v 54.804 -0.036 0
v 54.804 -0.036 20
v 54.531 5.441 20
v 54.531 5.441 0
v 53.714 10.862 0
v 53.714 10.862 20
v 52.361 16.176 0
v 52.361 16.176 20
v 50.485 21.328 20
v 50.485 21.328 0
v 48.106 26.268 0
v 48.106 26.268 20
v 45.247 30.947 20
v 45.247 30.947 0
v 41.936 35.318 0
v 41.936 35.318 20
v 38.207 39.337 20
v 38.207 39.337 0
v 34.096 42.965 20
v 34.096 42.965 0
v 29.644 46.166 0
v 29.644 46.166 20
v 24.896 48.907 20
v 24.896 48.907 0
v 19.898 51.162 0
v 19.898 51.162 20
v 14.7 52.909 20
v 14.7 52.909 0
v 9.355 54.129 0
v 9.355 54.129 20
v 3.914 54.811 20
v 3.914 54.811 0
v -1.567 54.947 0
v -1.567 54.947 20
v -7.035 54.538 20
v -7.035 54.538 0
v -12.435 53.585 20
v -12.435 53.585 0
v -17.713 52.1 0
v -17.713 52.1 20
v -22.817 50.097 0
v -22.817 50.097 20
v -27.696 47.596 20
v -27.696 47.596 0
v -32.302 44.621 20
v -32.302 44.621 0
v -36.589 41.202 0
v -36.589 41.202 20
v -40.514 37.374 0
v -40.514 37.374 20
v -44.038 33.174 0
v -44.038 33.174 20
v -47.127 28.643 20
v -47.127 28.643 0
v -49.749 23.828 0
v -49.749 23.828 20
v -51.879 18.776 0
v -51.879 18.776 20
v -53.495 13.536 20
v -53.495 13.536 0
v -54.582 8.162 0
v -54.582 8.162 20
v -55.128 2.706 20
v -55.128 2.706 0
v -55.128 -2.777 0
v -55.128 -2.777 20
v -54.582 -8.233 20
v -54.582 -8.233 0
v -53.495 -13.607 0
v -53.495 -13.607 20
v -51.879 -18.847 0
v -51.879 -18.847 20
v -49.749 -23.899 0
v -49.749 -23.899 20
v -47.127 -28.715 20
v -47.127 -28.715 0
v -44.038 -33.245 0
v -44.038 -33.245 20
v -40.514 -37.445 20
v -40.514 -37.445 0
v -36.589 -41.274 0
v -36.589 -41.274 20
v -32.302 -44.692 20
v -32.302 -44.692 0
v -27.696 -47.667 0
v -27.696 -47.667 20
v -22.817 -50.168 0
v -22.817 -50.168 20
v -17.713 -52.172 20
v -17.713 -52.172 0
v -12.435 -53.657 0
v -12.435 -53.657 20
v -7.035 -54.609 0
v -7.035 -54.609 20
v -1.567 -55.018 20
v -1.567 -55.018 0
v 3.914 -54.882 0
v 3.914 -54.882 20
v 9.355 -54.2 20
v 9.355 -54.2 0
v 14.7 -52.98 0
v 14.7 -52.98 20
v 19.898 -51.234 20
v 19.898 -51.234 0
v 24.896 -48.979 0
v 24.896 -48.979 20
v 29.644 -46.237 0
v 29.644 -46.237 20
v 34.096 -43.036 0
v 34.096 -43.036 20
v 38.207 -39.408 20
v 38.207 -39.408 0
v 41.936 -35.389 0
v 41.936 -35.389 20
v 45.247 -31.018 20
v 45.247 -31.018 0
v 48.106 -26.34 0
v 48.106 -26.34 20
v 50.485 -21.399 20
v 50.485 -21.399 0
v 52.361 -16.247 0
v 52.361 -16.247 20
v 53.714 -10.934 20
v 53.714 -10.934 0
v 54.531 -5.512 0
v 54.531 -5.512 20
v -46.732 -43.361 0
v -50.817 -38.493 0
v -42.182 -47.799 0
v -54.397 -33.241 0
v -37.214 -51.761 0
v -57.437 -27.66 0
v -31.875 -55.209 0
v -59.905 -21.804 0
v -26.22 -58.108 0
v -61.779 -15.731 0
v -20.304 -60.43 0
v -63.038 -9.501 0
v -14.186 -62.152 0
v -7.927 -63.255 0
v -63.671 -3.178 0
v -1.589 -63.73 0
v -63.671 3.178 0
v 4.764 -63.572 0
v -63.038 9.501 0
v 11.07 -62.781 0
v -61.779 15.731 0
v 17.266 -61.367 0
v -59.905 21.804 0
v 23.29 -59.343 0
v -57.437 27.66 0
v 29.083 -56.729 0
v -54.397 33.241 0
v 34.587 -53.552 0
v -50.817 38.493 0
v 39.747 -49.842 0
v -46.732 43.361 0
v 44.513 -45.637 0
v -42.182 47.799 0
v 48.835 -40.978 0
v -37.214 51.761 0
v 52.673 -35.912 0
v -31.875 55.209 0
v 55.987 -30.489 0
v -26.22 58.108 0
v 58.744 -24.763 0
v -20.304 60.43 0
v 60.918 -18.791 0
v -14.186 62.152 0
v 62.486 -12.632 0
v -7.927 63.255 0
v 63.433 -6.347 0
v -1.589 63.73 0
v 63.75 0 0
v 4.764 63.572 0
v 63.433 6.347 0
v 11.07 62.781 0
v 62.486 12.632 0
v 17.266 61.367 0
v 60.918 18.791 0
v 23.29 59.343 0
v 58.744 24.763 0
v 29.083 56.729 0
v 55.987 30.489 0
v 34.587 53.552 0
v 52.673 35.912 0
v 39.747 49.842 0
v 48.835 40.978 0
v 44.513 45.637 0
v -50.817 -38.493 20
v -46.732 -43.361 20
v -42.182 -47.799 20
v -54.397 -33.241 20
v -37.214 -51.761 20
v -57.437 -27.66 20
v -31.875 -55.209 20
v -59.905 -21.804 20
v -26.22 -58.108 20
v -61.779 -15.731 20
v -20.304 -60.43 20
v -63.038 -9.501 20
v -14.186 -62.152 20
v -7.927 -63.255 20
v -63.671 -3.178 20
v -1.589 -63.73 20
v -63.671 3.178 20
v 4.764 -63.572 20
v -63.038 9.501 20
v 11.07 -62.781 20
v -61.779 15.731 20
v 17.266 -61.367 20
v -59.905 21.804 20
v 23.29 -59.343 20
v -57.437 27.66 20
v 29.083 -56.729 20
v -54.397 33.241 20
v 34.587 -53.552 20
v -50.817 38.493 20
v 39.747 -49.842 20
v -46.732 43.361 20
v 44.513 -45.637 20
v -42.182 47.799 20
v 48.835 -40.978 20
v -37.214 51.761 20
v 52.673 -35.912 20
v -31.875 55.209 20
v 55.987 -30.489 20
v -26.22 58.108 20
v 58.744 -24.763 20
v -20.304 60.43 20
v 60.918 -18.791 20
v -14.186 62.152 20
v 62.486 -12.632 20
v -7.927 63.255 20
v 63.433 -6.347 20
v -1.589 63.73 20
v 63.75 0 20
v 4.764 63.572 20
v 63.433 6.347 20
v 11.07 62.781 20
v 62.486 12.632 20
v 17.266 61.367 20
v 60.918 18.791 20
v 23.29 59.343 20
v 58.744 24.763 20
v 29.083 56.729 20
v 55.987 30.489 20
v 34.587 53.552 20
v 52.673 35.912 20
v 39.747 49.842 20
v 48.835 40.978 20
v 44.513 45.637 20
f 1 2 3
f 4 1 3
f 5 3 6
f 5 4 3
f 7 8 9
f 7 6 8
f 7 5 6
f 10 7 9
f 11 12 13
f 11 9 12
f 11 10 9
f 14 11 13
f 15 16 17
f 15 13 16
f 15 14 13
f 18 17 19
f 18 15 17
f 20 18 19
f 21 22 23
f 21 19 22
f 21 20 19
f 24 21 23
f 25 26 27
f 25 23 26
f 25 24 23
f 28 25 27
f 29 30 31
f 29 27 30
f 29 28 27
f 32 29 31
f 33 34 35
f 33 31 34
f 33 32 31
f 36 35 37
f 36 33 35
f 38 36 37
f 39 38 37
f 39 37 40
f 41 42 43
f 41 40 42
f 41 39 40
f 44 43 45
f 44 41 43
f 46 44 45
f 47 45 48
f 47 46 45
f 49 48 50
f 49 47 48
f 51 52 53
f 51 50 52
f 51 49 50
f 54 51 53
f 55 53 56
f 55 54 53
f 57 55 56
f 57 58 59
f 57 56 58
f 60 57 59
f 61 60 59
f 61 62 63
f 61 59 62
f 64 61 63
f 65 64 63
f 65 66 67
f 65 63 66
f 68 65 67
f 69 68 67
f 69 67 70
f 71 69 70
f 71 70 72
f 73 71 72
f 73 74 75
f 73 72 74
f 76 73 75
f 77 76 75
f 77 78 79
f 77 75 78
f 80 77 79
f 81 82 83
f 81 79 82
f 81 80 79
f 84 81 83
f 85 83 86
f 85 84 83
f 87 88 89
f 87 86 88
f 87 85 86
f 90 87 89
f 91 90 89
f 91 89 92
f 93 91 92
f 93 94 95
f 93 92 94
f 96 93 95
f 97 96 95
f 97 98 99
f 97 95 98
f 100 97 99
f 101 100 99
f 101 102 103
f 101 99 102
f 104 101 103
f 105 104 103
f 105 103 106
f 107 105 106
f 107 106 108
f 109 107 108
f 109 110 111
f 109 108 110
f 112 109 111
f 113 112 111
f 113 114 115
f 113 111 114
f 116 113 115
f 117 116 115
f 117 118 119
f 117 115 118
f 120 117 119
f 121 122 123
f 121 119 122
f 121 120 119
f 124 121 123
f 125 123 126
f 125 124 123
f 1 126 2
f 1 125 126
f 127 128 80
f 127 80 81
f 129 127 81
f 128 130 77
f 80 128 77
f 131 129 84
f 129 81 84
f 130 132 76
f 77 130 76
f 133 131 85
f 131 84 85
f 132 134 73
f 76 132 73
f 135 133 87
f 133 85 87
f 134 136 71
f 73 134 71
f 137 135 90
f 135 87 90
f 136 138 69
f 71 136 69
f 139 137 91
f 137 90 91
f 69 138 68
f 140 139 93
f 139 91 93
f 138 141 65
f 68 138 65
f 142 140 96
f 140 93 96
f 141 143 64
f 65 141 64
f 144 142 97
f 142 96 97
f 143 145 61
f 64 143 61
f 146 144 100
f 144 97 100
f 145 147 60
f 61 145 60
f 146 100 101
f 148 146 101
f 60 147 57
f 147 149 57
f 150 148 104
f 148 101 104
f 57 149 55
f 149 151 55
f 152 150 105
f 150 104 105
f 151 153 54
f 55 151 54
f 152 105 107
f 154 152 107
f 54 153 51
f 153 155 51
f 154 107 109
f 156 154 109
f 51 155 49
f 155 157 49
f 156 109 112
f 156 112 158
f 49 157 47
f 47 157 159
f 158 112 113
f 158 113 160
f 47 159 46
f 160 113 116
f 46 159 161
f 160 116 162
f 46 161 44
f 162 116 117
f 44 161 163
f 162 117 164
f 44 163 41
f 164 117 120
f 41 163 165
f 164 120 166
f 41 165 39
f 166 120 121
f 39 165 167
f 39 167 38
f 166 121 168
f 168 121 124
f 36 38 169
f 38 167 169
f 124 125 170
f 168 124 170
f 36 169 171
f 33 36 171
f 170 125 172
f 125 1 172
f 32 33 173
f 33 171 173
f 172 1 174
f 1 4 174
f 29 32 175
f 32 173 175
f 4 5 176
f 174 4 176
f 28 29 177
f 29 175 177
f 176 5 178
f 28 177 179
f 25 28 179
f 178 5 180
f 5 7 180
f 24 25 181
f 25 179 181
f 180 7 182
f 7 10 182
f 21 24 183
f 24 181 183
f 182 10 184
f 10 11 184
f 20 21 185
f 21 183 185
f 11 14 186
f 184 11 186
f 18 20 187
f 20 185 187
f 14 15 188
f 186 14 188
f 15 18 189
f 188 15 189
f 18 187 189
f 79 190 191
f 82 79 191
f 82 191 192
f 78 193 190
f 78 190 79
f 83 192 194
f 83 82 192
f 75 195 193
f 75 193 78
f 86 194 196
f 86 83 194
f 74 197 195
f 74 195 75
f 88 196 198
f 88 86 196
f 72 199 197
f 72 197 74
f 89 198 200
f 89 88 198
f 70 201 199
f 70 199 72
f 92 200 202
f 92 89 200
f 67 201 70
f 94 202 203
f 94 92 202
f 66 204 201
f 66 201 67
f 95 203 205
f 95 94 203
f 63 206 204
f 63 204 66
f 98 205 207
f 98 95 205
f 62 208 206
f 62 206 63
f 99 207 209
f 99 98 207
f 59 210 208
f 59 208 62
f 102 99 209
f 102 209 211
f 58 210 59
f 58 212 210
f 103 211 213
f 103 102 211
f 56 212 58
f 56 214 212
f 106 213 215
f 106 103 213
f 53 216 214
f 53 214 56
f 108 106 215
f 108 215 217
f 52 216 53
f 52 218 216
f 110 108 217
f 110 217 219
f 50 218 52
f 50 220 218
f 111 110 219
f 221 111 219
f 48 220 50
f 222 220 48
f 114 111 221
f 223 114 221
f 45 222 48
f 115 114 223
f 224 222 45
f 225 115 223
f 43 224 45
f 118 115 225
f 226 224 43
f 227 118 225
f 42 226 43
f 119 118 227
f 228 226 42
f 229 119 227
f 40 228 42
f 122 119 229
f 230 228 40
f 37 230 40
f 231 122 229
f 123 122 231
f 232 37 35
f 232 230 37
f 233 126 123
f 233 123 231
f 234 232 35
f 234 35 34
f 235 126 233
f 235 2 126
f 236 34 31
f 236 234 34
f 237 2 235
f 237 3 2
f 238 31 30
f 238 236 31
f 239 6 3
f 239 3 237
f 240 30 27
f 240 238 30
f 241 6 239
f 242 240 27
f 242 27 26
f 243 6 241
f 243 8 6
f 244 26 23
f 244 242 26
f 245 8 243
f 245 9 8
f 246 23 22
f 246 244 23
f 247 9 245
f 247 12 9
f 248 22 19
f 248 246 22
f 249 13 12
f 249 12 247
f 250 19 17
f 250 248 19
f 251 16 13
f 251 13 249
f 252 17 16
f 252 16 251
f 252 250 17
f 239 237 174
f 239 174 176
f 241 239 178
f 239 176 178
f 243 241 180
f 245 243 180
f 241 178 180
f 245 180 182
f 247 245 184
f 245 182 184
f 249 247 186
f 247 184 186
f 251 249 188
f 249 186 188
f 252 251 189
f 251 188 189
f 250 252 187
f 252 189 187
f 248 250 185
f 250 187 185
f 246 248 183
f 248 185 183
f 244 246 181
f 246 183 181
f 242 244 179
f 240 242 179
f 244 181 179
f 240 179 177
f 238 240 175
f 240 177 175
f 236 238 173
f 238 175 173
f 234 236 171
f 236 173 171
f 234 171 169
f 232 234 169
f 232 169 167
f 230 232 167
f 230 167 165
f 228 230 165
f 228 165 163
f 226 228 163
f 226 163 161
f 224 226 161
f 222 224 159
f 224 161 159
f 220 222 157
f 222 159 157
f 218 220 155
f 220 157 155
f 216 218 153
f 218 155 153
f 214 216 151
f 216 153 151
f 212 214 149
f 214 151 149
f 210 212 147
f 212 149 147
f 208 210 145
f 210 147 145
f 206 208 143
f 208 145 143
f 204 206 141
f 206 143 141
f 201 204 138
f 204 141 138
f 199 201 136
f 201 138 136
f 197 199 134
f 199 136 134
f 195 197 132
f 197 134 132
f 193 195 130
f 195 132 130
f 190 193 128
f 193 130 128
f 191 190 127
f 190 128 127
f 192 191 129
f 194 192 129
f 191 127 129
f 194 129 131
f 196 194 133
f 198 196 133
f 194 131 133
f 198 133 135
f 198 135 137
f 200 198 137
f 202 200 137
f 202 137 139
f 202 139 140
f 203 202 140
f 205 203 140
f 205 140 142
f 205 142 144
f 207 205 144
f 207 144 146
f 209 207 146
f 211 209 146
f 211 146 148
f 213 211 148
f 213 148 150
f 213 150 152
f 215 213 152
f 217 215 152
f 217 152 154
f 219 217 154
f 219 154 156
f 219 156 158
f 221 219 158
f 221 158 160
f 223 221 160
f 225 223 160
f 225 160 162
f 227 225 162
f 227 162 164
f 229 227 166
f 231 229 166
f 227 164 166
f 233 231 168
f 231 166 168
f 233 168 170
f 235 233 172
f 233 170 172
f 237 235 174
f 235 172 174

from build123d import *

# Parameters (mm, degrees)
F0_R     = 63.75
F1_DEPTH = 20
F2_R     = 55
F3_DEPTH = 25


with BuildPart() as f1:
    # F0 (on Top) → F1 (new body)
    with BuildSketch(Plane.XY):
        Circle(F0_R)
    extrude(amount=F1_DEPTH)


with BuildPart() as f3:
    # F2 (on Top) → F3 (new body)
    with BuildSketch(Plane.XY):
        with Locations((-173.995957, -105.135567)):
            Circle(F2_R)
    extrude(amount=F3_DEPTH)


with BuildPart() as f3_1:
    # F4: moved
    add(f3.part.moved(Location((173.8, 105.1, -2.2))))


with BuildPart() as f1_1:
    add(f1.part)

    # F5: cut F3
    add(f3_1.part, mode=Mode.SUBTRACT)


solid = f1_1.part
